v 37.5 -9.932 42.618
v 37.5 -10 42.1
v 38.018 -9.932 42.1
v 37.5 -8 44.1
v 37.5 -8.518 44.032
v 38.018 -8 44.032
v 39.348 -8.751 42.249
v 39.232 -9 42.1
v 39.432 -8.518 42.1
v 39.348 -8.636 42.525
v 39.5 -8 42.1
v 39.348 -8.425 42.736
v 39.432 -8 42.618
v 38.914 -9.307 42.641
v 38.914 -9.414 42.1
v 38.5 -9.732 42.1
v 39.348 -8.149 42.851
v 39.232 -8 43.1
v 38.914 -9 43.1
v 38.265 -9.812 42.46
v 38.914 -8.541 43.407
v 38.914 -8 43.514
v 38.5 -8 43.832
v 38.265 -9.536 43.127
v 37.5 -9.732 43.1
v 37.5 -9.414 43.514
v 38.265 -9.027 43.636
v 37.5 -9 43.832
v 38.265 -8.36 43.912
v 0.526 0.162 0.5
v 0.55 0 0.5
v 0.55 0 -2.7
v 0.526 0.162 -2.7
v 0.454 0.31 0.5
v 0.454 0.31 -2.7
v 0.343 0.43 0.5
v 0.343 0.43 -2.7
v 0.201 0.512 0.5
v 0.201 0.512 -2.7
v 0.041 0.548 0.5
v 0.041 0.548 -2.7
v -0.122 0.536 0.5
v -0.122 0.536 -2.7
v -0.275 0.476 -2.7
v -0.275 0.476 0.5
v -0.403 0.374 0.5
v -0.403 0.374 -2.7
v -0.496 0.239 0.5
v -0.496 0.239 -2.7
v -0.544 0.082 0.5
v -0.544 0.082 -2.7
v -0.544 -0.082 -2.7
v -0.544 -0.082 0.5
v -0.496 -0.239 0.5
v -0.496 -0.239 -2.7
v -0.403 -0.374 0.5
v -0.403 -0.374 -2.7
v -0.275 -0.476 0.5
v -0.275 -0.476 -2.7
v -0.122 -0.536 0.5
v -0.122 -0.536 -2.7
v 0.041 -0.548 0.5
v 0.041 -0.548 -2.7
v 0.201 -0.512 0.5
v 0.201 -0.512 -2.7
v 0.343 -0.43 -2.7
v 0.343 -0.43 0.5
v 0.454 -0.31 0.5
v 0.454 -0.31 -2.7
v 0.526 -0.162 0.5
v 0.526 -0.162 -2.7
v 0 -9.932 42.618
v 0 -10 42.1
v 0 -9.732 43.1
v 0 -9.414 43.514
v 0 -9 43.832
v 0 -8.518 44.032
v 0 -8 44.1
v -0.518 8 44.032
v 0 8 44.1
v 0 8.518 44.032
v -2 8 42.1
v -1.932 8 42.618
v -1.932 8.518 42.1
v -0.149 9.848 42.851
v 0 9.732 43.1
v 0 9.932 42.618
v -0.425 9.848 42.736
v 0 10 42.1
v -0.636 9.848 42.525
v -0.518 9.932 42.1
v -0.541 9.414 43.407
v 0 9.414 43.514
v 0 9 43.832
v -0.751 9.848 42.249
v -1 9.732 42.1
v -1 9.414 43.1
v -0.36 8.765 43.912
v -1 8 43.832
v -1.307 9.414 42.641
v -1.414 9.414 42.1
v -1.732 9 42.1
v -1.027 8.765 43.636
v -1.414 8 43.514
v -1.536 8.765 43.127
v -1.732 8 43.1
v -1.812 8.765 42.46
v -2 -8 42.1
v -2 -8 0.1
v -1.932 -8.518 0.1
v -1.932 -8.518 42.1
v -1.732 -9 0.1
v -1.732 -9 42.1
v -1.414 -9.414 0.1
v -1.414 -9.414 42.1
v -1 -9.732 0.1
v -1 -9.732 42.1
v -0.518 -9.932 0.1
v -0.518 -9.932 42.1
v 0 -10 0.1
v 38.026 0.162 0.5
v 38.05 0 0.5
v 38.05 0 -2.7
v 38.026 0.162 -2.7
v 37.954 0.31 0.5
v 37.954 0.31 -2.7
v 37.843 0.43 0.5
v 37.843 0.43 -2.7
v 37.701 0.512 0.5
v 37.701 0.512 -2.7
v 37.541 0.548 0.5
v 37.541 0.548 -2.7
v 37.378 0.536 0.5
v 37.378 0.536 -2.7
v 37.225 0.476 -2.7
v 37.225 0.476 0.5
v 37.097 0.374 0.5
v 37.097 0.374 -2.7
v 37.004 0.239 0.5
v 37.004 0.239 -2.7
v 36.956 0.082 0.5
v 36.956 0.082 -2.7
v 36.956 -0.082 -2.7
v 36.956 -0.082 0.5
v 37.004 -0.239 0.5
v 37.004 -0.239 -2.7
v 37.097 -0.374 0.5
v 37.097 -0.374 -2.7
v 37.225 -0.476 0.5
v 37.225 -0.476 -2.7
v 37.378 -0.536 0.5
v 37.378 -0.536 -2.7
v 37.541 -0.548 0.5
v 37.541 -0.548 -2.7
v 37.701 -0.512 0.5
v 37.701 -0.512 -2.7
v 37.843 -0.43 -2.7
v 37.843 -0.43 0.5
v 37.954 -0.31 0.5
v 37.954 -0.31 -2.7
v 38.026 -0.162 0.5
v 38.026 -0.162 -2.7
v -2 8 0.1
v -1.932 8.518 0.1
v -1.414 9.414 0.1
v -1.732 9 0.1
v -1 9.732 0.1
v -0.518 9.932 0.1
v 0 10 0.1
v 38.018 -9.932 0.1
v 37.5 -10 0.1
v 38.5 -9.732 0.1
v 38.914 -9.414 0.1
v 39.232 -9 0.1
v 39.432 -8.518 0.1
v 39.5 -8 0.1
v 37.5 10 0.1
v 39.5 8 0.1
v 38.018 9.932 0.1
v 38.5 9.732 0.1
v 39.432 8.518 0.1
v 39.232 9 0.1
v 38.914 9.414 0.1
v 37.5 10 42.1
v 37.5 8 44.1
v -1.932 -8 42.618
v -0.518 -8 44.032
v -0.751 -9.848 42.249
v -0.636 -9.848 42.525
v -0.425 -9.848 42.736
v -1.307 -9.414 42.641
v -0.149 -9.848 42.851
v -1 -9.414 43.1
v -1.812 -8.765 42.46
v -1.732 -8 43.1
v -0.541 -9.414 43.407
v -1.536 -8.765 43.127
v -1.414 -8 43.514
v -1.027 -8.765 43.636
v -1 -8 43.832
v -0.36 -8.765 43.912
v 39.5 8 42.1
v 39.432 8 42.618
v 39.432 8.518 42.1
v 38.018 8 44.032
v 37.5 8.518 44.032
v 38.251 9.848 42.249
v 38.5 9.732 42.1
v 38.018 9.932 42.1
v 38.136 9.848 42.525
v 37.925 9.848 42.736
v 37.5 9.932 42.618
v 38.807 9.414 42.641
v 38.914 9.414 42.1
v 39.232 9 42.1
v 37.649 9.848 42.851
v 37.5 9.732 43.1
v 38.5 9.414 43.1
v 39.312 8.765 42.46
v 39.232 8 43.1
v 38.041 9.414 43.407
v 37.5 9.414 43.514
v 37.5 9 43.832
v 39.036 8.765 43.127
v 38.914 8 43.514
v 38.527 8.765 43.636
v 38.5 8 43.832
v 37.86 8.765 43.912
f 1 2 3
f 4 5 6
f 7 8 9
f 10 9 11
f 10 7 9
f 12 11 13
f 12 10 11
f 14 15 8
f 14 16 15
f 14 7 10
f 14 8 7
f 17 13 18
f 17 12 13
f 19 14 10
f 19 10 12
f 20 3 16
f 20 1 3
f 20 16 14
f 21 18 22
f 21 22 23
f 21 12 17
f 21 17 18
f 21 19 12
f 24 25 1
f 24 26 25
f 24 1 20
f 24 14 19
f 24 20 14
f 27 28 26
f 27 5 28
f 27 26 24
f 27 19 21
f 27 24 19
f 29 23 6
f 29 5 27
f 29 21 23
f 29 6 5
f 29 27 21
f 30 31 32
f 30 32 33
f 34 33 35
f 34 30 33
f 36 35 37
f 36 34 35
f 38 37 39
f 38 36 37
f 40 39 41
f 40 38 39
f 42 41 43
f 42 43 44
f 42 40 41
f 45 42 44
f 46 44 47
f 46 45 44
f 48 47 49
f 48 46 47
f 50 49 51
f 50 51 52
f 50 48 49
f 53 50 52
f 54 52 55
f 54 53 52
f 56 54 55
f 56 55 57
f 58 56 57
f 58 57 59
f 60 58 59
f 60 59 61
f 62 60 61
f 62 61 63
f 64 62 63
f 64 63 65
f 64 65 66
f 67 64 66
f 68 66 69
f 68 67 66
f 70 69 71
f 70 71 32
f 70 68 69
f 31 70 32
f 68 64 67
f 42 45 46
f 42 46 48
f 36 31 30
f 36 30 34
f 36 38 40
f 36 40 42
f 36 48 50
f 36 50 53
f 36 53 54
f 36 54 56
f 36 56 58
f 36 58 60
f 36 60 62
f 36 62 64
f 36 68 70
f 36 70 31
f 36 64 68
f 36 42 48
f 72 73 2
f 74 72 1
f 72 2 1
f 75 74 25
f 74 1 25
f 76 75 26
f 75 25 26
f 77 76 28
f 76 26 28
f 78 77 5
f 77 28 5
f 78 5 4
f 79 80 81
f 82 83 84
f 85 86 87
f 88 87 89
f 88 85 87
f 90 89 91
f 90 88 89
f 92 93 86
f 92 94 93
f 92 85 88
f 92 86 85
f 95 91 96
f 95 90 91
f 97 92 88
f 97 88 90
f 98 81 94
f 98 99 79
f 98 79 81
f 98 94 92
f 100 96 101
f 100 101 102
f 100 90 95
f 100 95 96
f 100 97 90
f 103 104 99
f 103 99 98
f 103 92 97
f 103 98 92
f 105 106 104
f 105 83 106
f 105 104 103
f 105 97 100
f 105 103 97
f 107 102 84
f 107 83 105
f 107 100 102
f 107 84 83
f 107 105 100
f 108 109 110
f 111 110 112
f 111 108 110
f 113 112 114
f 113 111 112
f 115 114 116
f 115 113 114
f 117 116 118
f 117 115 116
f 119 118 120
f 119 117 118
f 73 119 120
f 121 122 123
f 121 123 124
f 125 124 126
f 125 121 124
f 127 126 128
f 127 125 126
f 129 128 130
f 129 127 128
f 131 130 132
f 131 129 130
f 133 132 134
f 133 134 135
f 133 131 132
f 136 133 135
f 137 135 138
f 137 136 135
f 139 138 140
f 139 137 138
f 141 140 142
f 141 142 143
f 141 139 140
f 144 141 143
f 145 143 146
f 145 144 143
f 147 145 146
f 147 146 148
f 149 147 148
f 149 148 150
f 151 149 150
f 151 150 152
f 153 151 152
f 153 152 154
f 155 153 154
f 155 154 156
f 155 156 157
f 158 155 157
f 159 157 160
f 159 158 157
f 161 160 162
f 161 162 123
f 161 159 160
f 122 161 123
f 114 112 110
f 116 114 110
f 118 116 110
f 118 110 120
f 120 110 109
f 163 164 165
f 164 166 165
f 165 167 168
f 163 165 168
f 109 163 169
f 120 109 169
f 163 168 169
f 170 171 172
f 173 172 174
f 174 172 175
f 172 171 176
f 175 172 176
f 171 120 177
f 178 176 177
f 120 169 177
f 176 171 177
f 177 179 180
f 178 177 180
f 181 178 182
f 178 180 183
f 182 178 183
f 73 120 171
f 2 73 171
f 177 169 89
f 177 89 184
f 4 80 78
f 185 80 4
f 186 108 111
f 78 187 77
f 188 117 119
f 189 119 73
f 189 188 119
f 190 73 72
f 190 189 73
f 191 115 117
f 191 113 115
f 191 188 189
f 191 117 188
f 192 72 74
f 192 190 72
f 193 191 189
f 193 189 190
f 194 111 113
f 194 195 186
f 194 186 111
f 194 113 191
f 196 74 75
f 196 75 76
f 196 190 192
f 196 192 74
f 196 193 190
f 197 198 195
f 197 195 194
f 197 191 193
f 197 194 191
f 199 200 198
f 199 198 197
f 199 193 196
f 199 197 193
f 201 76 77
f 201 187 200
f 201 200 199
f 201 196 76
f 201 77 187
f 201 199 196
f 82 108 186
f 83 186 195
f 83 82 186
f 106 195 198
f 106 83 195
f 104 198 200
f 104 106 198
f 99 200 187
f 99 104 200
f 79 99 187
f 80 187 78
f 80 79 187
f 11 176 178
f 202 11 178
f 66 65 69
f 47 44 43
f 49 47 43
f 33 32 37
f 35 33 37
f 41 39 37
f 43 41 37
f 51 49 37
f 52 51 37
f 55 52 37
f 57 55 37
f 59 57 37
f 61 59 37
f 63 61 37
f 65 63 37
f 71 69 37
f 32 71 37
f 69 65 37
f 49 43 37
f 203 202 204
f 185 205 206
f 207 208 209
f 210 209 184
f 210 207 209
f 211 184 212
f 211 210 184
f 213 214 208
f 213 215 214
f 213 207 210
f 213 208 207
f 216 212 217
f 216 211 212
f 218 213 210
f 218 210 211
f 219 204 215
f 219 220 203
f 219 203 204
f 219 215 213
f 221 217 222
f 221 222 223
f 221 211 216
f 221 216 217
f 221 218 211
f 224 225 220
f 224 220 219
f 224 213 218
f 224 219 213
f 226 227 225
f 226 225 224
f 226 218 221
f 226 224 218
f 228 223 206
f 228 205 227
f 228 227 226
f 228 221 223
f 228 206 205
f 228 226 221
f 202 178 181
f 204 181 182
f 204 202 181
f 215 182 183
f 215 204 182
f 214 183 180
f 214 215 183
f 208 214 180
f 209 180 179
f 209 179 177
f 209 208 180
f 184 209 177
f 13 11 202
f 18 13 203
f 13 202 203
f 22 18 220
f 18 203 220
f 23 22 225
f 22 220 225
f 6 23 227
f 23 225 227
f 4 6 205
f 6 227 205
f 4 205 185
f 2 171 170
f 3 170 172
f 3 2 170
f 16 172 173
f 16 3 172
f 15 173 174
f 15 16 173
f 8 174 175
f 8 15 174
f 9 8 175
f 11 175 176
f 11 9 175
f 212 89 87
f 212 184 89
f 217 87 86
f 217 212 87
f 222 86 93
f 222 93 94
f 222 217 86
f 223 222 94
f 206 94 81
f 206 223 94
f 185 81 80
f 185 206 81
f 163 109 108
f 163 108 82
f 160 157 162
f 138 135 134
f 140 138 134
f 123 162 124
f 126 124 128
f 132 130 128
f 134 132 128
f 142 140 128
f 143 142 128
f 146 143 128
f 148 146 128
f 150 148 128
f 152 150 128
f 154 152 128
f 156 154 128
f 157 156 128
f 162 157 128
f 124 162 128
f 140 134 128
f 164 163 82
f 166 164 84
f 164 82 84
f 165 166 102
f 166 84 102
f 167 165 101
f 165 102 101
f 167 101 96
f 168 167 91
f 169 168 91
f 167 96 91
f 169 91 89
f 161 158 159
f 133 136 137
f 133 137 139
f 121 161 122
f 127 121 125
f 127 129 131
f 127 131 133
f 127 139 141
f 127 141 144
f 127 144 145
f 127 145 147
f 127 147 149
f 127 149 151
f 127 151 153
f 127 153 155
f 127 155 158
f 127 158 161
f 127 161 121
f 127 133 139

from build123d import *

# Parameters (mm, degrees)
SKETCH_W     = 41.5
SKETCH_H     = 20
PAD_DEPTH    = 44
FILLET_R     = 2
SKETCH001_R  = 0.55
PAD001_DEPTH = 3.2


with BuildPart() as fillet_body:
    # Sketch → Pad (new body)
    with BuildSketch(Plane.XY.offset(0.1)):
        with Locations((18.75, 0)):
            Rectangle(SKETCH_W, SKETCH_H)
    extrude(amount=PAD_DEPTH)

    # Fillet
    fillet_edges = [fillet_body.edges().sort_by_distance(p)[0] for p in [
        (-2, 0, 44.1),
        (-2, -10, 22.1),
        (18.75, -10, 44.1),
        (39.5, -10, 22.1),
        (39.5, 0, 44.1),
        (39.5, 10, 22.1),
        (18.75, 10, 44.1),
        (-2, 10, 22.1),
    ]]
    fillet(fillet_edges, radius=FILLET_R)


with BuildPart() as pad001:
    # Sketch001 → Pad001 (new body)
    with BuildSketch(Plane.XY.offset(0.5)):
        Circle(SKETCH001_R)
        with Locations((37.5, 0)):
            Circle(SKETCH001_R)
    extrude(amount=-PAD001_DEPTH)


solid = Compound([fillet_body.part, pad001.part])
